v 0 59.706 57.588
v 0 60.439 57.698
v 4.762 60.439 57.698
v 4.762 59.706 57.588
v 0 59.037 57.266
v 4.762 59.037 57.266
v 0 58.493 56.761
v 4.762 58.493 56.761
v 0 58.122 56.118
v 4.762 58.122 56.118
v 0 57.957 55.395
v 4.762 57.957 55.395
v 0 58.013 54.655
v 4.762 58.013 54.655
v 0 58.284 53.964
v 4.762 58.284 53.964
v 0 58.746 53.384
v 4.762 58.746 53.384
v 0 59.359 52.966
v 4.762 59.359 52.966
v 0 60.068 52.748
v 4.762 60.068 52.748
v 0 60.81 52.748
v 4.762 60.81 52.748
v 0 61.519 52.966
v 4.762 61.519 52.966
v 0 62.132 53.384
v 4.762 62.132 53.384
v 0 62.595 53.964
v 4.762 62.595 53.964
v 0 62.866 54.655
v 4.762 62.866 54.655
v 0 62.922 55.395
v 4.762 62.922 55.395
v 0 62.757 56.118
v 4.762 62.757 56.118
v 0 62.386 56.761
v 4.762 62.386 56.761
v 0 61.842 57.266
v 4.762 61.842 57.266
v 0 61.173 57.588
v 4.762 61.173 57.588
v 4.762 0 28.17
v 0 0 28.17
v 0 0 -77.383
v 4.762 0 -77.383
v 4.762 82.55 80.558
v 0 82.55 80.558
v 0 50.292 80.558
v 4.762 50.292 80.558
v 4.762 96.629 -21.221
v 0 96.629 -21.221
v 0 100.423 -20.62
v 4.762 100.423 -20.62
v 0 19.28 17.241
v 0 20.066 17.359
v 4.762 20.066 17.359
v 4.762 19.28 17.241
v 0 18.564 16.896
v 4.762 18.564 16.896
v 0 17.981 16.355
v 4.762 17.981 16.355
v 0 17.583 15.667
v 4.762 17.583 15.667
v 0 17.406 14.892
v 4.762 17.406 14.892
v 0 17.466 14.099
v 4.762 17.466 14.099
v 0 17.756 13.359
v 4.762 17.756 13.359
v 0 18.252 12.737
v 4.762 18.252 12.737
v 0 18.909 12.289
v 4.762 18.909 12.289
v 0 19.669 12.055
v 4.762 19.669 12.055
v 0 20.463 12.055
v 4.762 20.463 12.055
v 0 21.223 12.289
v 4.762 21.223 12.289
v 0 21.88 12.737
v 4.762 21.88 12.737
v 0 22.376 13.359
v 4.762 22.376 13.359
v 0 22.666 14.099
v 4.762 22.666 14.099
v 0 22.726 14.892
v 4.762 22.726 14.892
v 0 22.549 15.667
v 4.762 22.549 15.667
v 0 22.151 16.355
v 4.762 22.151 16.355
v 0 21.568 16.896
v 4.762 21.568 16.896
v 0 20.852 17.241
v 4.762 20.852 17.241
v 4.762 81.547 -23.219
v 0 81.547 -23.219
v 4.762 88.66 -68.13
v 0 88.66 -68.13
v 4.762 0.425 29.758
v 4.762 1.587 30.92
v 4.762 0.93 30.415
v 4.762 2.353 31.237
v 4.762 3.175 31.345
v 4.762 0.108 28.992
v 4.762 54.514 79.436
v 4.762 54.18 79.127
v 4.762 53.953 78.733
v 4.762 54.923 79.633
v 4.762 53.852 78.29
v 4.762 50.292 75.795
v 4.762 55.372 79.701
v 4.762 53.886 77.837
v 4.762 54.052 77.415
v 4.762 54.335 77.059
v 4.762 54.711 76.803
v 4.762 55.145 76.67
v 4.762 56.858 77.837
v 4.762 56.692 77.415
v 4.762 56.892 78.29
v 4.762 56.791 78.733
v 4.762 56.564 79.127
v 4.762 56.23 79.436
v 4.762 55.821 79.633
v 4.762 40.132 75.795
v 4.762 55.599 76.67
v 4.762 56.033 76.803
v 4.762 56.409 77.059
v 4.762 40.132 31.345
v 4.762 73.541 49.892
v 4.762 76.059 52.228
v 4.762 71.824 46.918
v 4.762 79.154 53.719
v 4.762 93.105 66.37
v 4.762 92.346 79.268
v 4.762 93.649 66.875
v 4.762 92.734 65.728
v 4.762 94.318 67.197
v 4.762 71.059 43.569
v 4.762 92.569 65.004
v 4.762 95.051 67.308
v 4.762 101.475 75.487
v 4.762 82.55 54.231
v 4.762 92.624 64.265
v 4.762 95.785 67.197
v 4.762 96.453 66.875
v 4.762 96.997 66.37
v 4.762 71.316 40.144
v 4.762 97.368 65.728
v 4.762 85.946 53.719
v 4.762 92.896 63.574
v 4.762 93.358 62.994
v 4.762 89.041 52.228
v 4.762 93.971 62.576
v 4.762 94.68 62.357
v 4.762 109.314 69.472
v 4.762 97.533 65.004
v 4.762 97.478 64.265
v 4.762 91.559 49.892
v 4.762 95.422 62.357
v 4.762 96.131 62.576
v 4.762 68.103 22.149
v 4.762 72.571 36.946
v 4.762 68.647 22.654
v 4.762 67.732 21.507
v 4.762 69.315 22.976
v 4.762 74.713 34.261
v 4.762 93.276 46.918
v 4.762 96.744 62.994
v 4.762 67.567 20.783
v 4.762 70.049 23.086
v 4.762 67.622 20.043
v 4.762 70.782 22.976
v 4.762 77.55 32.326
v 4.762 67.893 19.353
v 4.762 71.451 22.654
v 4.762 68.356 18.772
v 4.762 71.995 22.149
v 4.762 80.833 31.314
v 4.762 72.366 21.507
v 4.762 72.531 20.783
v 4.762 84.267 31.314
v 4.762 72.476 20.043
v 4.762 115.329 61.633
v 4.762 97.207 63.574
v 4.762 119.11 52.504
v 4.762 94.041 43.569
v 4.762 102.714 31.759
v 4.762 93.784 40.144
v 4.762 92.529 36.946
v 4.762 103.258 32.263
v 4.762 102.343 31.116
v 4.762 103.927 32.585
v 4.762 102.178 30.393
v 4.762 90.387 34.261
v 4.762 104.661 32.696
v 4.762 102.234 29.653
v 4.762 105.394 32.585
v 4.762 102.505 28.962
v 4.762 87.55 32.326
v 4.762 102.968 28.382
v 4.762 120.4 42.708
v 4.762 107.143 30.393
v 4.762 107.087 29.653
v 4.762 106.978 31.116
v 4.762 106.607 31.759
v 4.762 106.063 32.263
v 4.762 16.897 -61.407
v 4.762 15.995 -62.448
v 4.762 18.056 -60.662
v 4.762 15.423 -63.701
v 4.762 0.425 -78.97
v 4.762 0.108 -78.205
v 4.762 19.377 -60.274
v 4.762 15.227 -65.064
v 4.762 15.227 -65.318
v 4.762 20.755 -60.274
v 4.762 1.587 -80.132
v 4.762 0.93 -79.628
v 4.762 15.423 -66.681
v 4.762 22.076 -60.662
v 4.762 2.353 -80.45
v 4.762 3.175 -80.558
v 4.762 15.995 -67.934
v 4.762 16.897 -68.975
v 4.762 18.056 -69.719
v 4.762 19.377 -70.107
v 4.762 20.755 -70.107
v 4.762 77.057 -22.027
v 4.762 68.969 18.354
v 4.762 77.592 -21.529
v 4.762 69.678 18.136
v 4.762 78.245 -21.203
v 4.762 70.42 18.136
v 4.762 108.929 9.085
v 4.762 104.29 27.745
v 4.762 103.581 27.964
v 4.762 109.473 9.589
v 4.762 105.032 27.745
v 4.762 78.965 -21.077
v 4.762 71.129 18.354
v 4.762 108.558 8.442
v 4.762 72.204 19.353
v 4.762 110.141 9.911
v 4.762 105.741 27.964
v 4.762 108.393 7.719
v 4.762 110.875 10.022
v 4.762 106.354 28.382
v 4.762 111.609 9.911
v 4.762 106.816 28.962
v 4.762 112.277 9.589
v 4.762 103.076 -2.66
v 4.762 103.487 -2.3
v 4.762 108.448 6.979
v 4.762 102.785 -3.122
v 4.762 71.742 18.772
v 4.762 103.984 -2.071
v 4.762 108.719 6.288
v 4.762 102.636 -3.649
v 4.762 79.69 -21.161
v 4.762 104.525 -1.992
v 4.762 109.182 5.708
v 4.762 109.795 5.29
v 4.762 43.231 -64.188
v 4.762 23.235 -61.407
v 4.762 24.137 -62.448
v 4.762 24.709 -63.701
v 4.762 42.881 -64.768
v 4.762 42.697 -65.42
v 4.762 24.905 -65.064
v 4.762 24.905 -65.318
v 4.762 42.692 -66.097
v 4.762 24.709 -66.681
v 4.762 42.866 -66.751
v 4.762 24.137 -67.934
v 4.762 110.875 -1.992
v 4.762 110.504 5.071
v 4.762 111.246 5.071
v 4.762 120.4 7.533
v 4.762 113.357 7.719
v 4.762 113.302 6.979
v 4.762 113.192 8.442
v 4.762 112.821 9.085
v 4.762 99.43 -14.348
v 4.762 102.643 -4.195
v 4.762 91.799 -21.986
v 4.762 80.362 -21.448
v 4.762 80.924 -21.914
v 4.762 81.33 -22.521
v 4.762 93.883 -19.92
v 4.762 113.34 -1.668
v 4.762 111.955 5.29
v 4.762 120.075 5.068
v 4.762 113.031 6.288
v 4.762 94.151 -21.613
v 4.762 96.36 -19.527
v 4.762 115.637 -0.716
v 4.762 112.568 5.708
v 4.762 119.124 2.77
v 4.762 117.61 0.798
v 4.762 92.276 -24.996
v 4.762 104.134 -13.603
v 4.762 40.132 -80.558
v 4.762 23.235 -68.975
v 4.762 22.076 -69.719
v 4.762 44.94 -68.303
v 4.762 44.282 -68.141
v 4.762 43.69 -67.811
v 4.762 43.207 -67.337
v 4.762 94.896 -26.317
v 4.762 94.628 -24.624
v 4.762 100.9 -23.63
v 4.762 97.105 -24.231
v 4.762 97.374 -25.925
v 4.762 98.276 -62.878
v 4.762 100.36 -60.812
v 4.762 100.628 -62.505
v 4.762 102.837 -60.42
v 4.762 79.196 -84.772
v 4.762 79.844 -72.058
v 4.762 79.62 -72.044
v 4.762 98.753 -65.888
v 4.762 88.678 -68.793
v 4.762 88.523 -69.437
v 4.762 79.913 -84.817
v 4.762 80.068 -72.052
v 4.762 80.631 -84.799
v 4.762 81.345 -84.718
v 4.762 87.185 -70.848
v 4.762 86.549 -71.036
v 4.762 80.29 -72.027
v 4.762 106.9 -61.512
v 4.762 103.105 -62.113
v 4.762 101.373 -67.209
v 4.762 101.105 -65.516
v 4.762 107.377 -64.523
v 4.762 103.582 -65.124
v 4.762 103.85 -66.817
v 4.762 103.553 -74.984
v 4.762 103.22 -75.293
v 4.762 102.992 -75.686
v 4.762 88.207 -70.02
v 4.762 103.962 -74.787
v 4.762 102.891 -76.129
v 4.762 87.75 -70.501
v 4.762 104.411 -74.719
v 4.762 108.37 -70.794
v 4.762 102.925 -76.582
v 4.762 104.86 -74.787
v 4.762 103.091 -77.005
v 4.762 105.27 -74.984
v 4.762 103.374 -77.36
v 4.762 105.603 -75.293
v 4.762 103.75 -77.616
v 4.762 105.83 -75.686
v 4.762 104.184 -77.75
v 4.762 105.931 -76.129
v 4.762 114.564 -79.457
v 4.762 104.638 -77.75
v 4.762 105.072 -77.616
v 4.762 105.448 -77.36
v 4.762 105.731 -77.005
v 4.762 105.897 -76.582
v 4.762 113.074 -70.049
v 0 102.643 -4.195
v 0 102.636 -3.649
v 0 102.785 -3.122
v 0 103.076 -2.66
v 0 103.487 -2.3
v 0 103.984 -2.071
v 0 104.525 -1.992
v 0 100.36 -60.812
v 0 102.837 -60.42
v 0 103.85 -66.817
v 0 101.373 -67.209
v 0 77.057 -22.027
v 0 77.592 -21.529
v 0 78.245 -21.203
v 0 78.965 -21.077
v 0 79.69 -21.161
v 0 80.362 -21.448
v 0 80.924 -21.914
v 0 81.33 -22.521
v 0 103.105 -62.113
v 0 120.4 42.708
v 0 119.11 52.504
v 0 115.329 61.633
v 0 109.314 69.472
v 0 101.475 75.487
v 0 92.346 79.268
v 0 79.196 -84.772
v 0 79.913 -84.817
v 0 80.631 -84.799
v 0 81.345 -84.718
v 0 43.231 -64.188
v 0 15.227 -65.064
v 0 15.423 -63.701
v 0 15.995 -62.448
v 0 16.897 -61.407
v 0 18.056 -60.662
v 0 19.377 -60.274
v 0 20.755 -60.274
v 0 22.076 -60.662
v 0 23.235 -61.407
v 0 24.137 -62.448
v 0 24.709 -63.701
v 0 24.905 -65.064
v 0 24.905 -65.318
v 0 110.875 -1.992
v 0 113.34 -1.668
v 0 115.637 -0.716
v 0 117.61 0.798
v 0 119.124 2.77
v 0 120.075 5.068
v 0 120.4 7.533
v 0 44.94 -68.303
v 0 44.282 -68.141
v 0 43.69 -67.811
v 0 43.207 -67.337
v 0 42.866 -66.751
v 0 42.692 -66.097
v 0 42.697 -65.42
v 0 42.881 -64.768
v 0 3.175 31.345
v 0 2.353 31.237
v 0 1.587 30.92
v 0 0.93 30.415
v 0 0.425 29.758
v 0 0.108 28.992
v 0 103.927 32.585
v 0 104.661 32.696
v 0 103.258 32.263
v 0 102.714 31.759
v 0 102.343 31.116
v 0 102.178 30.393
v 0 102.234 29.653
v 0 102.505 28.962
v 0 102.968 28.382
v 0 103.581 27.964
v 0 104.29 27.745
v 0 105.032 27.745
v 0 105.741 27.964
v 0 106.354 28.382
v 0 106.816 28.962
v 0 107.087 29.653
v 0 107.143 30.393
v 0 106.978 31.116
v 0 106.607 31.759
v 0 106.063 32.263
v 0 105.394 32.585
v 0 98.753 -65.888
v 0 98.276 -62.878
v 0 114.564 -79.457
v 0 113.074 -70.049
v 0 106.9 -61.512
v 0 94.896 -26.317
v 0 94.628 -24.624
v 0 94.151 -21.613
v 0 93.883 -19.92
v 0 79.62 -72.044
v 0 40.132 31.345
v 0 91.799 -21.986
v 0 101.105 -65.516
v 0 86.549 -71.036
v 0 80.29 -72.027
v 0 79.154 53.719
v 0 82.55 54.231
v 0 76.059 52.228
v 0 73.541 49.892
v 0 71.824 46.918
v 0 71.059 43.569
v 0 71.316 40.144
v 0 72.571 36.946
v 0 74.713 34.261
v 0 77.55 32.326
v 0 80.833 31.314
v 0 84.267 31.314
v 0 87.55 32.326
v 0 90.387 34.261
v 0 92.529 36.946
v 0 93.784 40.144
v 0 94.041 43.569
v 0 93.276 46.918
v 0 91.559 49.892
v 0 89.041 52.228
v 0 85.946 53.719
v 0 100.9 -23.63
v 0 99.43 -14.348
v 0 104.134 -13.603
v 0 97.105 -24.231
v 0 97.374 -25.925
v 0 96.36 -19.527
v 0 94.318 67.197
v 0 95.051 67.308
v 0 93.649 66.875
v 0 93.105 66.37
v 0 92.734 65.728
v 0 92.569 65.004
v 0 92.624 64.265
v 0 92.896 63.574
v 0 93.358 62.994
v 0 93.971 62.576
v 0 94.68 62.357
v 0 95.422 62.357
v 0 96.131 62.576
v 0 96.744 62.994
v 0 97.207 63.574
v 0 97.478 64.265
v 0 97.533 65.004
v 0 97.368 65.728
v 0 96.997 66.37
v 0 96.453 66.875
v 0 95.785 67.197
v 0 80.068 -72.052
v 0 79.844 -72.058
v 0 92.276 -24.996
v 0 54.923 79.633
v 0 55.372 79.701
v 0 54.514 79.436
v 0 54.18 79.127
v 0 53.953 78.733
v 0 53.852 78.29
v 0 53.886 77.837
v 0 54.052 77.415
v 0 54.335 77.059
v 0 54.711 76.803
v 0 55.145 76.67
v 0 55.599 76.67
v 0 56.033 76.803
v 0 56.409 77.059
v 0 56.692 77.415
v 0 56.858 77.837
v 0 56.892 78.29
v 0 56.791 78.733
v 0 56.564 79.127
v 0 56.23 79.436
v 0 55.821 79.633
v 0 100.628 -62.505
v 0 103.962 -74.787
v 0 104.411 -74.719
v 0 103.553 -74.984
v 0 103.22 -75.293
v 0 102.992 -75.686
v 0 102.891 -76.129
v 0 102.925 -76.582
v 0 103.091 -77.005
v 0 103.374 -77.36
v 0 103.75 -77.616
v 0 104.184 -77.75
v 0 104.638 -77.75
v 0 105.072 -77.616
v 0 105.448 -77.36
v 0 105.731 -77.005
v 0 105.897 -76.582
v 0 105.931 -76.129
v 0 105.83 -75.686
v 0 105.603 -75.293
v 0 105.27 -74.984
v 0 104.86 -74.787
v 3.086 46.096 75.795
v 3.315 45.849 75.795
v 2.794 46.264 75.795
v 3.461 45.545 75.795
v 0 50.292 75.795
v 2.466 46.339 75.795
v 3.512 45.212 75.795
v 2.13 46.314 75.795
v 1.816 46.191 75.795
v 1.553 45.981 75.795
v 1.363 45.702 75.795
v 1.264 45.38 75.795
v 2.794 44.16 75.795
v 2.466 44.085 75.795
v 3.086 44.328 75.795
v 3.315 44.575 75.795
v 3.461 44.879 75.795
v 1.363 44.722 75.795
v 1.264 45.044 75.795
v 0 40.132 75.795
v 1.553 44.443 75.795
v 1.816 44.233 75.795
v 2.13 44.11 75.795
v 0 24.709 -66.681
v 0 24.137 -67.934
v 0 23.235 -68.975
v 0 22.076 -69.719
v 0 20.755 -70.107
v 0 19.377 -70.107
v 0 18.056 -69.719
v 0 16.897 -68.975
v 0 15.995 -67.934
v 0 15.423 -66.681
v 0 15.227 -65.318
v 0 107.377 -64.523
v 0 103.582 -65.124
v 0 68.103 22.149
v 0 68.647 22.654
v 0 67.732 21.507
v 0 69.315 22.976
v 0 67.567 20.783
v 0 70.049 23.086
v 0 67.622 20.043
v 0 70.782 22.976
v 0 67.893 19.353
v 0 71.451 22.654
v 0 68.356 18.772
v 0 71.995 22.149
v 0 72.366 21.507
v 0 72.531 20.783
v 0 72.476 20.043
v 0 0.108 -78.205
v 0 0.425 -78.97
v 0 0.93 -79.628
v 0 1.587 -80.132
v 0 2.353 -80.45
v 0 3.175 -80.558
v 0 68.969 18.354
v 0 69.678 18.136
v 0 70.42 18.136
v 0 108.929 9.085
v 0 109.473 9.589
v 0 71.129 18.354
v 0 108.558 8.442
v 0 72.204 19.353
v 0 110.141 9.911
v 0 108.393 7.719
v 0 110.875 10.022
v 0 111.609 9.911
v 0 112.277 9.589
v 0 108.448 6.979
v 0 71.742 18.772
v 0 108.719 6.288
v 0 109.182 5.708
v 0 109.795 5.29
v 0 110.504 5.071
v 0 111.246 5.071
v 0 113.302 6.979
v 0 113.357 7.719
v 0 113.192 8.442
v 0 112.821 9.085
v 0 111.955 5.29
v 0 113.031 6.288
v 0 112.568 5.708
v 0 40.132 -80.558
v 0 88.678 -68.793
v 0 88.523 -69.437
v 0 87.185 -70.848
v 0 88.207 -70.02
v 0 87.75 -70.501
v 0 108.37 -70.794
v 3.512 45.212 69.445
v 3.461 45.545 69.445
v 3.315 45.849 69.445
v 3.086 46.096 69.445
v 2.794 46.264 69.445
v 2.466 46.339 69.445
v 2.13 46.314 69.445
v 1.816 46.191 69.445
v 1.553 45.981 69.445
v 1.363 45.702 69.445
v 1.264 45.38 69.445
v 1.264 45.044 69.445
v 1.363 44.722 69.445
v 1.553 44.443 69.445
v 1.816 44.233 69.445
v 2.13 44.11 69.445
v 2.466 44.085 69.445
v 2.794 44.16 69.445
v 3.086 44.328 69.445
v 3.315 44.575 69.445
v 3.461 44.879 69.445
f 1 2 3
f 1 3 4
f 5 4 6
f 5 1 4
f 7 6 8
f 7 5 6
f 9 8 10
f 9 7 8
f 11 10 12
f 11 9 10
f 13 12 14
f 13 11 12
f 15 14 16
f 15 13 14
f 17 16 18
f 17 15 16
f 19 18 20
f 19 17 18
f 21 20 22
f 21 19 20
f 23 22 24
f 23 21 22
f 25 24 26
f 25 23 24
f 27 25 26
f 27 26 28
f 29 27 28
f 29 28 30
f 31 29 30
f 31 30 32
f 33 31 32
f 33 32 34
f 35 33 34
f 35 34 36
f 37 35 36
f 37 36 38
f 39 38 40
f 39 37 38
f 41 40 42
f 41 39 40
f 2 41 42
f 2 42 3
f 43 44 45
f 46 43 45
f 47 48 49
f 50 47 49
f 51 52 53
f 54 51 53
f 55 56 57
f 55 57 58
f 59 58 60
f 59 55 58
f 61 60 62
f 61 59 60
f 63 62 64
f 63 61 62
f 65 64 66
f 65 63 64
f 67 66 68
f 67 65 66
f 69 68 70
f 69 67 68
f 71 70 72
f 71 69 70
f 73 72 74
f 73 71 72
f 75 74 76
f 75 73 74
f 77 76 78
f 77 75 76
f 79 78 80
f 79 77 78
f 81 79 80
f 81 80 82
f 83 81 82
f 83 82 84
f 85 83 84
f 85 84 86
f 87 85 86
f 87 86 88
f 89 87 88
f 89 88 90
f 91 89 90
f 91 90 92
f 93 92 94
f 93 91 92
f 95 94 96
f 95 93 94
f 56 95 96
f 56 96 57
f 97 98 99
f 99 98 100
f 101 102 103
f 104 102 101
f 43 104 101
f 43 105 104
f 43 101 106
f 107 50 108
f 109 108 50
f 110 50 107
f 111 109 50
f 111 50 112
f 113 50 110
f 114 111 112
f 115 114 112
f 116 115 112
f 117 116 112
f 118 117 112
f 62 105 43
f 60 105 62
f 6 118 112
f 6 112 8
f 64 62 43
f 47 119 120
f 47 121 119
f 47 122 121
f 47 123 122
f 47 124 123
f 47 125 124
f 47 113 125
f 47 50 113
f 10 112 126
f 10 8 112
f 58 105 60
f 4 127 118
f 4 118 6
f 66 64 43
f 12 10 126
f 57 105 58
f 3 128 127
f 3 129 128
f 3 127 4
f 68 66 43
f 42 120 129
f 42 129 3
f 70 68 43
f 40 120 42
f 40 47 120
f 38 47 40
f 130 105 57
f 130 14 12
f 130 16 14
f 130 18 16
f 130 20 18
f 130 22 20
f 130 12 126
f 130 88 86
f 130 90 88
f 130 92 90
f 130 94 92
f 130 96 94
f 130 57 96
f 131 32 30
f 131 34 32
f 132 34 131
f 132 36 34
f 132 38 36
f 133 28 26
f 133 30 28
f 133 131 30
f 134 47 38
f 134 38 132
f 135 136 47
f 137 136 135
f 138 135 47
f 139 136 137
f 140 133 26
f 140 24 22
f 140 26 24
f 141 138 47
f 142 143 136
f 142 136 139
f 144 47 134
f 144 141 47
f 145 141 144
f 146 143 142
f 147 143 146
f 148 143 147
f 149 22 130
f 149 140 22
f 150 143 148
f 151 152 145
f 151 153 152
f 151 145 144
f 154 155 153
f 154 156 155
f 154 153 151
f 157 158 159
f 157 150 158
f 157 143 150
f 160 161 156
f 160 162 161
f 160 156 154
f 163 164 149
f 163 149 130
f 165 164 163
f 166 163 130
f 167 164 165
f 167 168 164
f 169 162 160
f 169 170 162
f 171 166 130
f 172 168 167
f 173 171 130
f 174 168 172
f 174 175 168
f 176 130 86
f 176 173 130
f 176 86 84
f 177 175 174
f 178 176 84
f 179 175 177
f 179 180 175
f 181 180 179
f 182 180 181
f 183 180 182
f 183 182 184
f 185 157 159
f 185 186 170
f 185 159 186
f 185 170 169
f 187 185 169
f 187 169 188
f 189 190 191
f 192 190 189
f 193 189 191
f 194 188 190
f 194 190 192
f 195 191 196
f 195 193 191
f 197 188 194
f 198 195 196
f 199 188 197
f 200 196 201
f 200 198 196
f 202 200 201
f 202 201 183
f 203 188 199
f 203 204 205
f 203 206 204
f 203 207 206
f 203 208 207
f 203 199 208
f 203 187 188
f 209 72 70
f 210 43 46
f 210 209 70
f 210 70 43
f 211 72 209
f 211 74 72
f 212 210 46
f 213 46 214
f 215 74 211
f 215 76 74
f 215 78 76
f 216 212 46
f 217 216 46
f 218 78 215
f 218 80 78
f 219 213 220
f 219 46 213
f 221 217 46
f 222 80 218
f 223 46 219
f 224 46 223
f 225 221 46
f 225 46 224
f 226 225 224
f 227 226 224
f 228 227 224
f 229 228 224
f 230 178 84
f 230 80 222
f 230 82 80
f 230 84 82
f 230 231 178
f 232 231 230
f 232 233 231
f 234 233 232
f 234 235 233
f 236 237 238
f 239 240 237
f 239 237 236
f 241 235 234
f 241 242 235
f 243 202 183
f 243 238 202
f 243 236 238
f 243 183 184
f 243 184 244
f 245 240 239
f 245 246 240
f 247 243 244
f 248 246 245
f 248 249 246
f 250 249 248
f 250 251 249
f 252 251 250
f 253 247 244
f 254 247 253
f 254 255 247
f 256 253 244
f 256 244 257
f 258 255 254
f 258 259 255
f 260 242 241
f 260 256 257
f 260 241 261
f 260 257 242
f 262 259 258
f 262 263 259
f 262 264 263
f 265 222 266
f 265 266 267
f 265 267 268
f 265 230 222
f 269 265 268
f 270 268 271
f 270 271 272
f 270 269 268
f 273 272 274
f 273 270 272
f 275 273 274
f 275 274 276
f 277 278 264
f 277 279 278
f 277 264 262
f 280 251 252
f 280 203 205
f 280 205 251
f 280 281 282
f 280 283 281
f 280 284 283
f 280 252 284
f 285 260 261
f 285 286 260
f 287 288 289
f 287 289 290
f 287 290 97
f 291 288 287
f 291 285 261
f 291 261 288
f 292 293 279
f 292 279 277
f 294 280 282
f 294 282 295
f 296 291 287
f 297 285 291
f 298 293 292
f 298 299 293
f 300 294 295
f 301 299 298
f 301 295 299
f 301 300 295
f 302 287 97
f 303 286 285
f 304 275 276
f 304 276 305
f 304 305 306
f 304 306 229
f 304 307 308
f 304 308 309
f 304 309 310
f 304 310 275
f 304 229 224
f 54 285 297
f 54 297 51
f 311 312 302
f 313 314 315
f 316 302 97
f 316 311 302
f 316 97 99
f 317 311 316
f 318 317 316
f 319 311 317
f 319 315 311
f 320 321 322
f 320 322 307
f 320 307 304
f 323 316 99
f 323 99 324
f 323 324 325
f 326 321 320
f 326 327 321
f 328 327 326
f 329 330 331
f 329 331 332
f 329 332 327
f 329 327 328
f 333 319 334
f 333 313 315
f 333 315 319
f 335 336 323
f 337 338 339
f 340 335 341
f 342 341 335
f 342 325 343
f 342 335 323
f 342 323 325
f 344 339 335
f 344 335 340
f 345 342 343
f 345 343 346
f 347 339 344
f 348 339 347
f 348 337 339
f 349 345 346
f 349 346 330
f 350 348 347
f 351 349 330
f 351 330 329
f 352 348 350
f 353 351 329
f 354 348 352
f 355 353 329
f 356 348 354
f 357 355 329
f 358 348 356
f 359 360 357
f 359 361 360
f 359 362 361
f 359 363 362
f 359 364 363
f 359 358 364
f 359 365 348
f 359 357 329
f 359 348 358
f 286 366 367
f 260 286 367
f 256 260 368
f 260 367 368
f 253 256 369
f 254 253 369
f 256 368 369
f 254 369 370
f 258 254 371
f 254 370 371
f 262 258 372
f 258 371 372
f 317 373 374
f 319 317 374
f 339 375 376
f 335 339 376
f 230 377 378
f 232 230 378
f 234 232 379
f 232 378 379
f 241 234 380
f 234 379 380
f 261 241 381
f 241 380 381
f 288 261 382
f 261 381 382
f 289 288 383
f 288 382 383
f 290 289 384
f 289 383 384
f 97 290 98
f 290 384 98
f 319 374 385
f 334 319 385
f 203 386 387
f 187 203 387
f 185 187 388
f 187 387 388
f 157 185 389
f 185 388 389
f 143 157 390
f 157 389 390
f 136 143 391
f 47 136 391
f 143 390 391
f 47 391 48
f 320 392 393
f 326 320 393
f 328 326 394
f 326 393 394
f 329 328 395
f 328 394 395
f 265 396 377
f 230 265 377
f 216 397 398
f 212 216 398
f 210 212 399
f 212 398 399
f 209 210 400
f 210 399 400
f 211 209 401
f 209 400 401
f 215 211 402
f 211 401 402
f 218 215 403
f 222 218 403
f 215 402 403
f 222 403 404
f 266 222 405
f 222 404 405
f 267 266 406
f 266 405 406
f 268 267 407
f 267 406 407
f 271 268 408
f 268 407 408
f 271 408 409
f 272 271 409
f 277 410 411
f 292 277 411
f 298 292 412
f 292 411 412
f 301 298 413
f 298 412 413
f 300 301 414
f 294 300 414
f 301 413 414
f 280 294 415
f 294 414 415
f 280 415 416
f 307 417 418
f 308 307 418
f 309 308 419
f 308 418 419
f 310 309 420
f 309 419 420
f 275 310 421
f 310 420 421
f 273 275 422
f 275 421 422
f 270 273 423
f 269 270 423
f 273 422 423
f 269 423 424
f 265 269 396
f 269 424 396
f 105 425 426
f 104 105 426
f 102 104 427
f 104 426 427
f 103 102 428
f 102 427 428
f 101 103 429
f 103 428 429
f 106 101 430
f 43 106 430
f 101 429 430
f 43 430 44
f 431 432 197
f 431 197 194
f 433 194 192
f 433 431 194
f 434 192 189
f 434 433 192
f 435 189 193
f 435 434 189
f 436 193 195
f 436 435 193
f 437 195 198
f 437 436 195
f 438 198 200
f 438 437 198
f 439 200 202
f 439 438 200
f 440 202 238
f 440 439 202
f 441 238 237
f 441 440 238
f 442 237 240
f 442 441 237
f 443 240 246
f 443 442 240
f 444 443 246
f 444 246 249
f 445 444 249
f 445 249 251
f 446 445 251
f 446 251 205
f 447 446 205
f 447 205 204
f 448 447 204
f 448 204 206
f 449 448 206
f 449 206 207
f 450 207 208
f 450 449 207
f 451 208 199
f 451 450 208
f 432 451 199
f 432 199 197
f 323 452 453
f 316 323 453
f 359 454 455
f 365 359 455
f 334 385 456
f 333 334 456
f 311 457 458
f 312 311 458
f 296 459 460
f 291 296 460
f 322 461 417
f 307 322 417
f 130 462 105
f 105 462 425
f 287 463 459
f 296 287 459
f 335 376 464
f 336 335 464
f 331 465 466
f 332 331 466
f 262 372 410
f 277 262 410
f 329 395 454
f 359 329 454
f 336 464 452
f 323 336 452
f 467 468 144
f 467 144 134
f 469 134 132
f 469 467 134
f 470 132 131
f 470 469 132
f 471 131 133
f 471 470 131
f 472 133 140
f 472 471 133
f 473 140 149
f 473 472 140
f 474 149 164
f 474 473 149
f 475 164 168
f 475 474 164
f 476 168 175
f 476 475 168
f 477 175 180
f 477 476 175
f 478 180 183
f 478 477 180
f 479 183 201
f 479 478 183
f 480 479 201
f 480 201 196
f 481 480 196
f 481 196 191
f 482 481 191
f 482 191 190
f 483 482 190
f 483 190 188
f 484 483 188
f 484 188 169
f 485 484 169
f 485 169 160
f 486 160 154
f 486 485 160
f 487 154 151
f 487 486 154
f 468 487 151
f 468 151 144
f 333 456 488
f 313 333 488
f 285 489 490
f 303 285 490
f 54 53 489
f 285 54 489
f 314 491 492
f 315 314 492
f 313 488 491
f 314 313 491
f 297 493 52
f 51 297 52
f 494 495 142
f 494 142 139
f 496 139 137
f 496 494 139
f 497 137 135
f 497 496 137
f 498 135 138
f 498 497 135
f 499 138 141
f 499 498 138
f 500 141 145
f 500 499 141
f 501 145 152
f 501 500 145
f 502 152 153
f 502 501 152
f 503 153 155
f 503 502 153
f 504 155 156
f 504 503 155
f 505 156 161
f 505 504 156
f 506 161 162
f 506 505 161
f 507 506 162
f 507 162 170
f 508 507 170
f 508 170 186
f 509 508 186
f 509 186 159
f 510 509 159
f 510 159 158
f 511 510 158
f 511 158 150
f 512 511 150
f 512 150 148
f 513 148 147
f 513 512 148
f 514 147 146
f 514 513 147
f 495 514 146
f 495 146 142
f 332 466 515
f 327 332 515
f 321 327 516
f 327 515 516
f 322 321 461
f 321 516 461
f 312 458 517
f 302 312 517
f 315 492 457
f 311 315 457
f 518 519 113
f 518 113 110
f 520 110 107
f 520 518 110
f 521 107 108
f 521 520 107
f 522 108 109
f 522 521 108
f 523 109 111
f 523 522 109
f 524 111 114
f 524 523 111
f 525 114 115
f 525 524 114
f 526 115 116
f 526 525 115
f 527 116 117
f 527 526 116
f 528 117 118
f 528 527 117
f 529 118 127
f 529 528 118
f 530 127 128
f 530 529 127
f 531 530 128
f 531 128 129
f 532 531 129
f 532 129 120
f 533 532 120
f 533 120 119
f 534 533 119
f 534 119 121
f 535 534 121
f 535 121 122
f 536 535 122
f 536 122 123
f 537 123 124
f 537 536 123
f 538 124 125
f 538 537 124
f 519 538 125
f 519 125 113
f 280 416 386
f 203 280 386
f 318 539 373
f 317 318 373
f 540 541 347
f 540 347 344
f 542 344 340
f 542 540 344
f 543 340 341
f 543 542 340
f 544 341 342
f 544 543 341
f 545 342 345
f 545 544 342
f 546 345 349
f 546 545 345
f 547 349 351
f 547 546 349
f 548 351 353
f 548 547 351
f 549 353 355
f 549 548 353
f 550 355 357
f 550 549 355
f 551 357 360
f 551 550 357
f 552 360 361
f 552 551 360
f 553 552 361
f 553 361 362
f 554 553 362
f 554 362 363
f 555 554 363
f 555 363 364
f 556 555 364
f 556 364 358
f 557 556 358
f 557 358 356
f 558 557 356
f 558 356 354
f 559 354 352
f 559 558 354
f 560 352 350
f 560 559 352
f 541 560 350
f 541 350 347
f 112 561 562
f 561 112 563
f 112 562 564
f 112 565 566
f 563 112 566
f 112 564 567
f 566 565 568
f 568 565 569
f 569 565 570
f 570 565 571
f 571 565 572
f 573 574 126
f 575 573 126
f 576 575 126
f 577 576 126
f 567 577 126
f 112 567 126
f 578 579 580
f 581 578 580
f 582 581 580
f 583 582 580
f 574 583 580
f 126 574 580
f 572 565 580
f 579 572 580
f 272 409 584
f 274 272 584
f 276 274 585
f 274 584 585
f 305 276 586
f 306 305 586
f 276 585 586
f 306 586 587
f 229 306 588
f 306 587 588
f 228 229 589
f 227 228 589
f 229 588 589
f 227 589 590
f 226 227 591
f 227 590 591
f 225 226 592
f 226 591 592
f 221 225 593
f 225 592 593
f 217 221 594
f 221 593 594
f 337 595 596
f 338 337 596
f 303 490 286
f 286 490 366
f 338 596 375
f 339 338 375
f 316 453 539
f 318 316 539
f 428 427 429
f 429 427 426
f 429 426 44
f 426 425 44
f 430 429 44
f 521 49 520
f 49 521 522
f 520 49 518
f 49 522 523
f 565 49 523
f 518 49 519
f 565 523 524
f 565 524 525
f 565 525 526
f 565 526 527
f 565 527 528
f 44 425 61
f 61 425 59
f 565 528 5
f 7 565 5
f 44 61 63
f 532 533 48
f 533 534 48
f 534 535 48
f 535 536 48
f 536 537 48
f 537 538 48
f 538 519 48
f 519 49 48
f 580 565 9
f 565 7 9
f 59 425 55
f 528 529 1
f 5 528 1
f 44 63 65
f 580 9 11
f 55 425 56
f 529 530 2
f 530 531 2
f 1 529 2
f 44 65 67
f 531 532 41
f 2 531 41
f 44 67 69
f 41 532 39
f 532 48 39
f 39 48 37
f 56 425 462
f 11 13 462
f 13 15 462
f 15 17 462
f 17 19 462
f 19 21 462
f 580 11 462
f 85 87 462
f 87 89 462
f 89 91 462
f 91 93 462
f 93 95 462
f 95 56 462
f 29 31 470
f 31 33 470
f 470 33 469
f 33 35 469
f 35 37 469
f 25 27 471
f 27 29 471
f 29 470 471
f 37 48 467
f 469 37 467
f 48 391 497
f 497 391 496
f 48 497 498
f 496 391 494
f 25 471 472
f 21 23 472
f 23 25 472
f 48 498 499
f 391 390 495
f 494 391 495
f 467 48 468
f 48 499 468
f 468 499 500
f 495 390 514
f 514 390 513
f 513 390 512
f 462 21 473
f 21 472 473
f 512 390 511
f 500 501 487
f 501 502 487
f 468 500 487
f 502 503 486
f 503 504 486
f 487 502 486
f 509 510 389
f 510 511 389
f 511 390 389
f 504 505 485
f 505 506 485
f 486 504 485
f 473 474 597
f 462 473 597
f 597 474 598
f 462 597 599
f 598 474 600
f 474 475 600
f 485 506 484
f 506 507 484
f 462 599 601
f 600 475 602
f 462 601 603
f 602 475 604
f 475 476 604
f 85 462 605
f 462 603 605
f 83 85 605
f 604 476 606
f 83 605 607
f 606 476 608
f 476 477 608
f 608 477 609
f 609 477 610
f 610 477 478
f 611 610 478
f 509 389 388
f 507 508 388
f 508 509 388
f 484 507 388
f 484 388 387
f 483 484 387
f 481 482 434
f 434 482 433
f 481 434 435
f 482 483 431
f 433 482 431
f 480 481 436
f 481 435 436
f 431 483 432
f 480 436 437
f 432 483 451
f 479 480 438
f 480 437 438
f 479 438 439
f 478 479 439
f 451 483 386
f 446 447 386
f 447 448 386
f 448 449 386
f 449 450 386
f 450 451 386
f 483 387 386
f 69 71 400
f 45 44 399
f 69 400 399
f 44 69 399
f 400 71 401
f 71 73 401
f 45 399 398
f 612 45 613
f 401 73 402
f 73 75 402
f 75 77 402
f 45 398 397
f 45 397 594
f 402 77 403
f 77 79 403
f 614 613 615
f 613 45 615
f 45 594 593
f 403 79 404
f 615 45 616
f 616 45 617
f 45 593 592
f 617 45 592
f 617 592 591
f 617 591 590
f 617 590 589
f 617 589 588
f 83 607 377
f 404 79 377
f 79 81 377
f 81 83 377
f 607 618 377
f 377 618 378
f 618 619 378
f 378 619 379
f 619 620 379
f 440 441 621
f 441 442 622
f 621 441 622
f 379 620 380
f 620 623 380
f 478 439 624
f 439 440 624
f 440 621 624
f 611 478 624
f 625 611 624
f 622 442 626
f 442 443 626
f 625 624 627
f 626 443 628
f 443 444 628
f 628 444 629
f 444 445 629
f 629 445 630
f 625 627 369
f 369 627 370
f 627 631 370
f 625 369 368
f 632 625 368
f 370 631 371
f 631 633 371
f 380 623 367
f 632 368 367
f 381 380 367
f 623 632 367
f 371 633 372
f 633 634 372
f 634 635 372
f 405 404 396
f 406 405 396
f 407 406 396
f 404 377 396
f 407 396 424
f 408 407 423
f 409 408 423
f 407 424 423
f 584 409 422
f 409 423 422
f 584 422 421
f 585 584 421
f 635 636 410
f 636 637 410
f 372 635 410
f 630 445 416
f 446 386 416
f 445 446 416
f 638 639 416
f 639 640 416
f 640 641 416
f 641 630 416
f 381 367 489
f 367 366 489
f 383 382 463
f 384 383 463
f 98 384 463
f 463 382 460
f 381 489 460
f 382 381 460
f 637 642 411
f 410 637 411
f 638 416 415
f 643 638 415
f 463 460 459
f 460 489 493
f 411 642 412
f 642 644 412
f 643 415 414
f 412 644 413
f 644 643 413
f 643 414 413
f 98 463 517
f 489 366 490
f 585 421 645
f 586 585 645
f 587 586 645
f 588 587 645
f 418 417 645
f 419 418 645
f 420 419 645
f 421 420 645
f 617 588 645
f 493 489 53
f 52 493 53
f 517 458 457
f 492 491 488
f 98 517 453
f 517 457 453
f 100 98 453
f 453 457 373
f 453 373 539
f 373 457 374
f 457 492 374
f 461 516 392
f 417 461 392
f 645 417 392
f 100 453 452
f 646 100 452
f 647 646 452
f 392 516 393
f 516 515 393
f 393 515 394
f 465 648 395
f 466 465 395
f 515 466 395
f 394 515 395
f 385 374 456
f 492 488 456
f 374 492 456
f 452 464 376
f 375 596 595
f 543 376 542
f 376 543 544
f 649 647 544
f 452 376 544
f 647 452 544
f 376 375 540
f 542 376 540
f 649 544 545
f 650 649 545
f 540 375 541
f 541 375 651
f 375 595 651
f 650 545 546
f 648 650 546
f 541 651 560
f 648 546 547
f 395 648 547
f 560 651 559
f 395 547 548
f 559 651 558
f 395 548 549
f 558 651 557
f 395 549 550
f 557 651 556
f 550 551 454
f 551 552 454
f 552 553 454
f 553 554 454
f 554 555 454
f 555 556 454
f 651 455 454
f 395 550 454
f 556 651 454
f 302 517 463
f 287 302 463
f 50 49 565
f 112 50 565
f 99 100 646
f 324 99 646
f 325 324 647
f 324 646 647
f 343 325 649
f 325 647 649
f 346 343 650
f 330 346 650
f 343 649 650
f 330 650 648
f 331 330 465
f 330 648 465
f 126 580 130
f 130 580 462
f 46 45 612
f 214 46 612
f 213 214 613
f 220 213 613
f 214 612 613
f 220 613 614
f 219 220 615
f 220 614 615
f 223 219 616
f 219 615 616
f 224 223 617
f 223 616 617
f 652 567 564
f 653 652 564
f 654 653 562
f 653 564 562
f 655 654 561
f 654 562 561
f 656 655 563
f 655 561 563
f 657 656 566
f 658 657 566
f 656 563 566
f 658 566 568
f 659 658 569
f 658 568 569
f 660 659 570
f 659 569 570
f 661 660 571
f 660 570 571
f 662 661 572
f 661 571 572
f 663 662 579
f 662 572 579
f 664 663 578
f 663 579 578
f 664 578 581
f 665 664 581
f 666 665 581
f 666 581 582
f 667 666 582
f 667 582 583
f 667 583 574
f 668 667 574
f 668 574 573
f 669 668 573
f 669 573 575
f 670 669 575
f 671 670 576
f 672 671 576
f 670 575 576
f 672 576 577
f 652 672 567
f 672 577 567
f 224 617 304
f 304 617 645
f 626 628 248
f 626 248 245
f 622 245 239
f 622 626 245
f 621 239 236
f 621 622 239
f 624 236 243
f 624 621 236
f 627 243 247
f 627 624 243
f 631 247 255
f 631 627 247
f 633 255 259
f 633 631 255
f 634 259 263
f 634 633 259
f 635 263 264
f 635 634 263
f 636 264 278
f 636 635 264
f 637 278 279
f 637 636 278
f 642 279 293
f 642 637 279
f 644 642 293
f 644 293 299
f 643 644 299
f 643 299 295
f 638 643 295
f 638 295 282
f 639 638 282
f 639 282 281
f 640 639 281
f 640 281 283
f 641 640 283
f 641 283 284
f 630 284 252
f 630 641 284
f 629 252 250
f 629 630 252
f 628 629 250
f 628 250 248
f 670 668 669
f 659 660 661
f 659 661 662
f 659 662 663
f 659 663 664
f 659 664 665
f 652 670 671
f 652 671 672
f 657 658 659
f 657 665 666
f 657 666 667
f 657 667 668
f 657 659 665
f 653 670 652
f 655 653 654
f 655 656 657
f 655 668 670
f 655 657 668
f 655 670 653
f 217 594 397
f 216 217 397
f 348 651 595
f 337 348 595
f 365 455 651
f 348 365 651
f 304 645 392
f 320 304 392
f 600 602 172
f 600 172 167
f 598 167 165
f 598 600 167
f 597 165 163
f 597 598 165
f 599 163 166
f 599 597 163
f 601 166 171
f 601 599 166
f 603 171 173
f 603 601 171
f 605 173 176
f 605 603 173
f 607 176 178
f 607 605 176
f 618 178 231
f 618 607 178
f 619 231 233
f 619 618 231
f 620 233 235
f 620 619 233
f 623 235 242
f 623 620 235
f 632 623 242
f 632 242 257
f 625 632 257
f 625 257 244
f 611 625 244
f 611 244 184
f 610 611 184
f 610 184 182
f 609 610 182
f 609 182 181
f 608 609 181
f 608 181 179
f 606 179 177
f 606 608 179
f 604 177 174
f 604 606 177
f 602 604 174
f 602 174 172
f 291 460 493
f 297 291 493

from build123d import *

# Parameters (mm, degrees)
SKETCH1_R           = 2.4892
SKETCH1_R_2         = 2.667
SKETCH1_R_3         = 1.524
SKETCH1_R_4         = 11.522750336
BOSS_EXTRUDE1_DEPTH = 4.7625
SKETCH2_R           = 1.1303
CUT_EXTRUDE1_DEPTH  = 6.35


with BuildPart() as part:
    # Sketch1 → Boss-Extrude1 (new body)
    with BuildSketch(Plane(origin=(0, 0, 0), x_dir=(0, 0, -1), z_dir=(1, 0, 0))):
        with BuildLine():
            Line((-28.170295117, 0), (77.382795117, 0))
            ThreePointArc((77.382795117, 0), (79.627859148, 0.92993597), (80.557795117, 3.175))
            Line((80.557795117, 3.175), (80.557795117, 40.132))
            Line((80.557795117, 40.132), (84.771740045, 79.196103092))
            ThreePointArc((84.771740045, 79.196103092), (84.816236398, 80.272287311), (84.718413682, 81.344939685))
            Line((84.718413682, 81.344939685), (79.457064092, 114.563793628))
            Line((79.457064092, 114.563793628), (70.049332648, 113.073755348))
            Line((70.049332648, 113.073755348), (70.794351787, 108.369889626))
            Line((70.794351787, 108.369889626), (64.522530825, 107.376530773))
            Line((64.522530825, 107.376530773), (65.123512931, 103.582079091))
            Line((65.123512931, 103.582079091), (66.816904591, 103.850285981))
            Line((66.816904591, 103.850285981), (67.209281338, 101.372916701))
            Line((67.209281338, 101.372916701), (65.515889678, 101.10470981))
            Line((65.515889678, 101.10470981), (65.888399247, 98.752776949))
            Line((65.888399247, 98.752776949), (62.877925185, 98.2759647))
            Line((62.877925185, 98.2759647), (62.505415615, 100.627897561))
            Line((62.505415615, 100.627897561), (60.812023956, 100.359690671))
            Line((60.812023956, 100.359690671), (60.419647209, 102.837059951))
            Line((60.419647209, 102.837059951), (62.113038869, 103.105266841))
            Line((62.113038869, 103.105266841), (61.512056762, 106.899718524))
            Line((61.512056762, 106.899718524), (23.630258147, 100.899831052))
            Line((23.630258147, 100.899831052), (24.231240253, 97.105379369))
            Line((24.231240253, 97.105379369), (25.924631913, 97.373586259))
            Line((25.924631913, 97.373586259), (26.31700866, 94.896216979))
            Line((26.31700866, 94.896216979), (24.623617, 94.628010089))
            Line((24.623617, 94.628010089), (24.99612657, 92.276077228))
            Line((24.99612657, 92.276077228), (21.985652508, 91.799264978))
            Line((21.985652508, 91.799264978), (21.613142938, 94.151197839))
            Line((21.613142938, 94.151197839), (19.919751278, 93.882990949))
            Line((19.919751278, 93.882990949), (19.527374531, 96.360360229))
            Line((19.527374531, 96.360360229), (21.220766191, 96.62856712))
            Line((21.220766191, 96.62856712), (20.619784085, 100.423018802))
            Line((20.619784085, 100.423018802), (14.347963122, 99.429659949))
            Line((14.347963122, 99.429659949), (13.602943983, 104.133525671))
            Line((13.602943983, 104.133525671), (4.195212538, 102.643487392))
            ThreePointArc((4.195212538, 102.643487392), (2.66000635, 103.076460316), (1.992204883, 104.52503368))
            Line((1.992204883, 104.52503368), (1.992204883, 110.875))
            ThreePointArc((1.992204883, 110.875), (-0.797603027, 117.610192091), (-7.532795117, 120.4))
            Line((-7.532795117, 120.4), (-42.707795117, 120.4))
            ThreePointArc((-42.707795117, 120.4), (-69.471786785, 109.313991668), (-80.557795117, 82.55))
            Line((-80.557795117, 82.55), (-80.557795117, 50.292))
            Line((-80.557795117, 50.292), (-75.795295117, 50.292))
            Line((-75.795295117, 50.292), (-75.795295117, 40.132))
            Line((-75.795295117, 40.132), (-31.345295117, 40.132))
            Line((-31.345295117, 40.132), (-31.345295117, 3.175))
            ThreePointArc((-31.345295117, 3.175), (-30.415359148, 0.92993597), (-28.170295117, 0))
        make_face()
        with Locations(Location((-55.209041359, 60.43939525, 0), (0, 0, 180))):
            Circle(SKETCH1_R, mode=Mode.SUBTRACT)
        with Locations(Location((-14.692204883, 20.066, 0), (0, 0, 180))):
            Circle(SKETCH1_R_2, mode=Mode.SUBTRACT)
        with Locations(Location((-20.597190367, 70.048753759, 0), (0, 0, 180))):
            Circle(SKETCH1_R, mode=Mode.SUBTRACT)
        with Locations(Location((-64.818399868, 95.051246241, 0), (0, 0, 180))):
            Circle(SKETCH1_R, mode=Mode.SUBTRACT)
        with Locations(Location((-30.206548876, 104.66060475, 0), (0, 0, 180))):
            Circle(SKETCH1_R, mode=Mode.SUBTRACT)
        with Locations(Location((-78.176545117, 55.372, 0), (0, 0, 180))):
            Circle(SKETCH1_R_3, mode=Mode.SUBTRACT)
        with Locations(Location((-42.707795117, 82.55, 0), (0, 0, 180))):
            Circle(SKETCH1_R_4, mode=Mode.SUBTRACT)
        with Locations(Location((-7.532795117, 110.875, 0), (0, 0, 180))):
            Circle(SKETCH1_R, mode=Mode.SUBTRACT)
        with Locations(Location((76.243236649, 104.411043044, 0), (0, 0, 180))):
            Circle(SKETCH1_R_3, mode=Mode.SUBTRACT)
        with BuildLine():
            Line((65.317795117, 15.2273), (65.063795117, 15.2273))
            ThreePointArc((65.063795117, 15.2273), (60.225095117, 20.066), (65.063795117, 24.9047))
            Line((65.063795117, 24.9047), (65.317795117, 24.9047))
            ThreePointArc((65.317795117, 24.9047), (70.156495117, 20.066), (65.317795117, 15.2273))
        make_face(mode=Mode.SUBTRACT)
        with BuildLine():
            Line((71.035861406, 86.549018926), (72.027193342, 80.289995416))
            ThreePointArc((72.027193342, 80.289995416), (72.057683184, 79.9556661), (72.043814352, 79.620235963))
            Line((72.043814352, 79.620235963), (68.302723543, 44.939584088))
            ThreePointArc((68.302723543, 44.939584088), (66.751491112, 42.866217372), (64.187855338, 43.230831164))
            Line((64.187855338, 43.230831164), (22.026684653, 77.057314107))
            ThreePointArc((22.026684653, 77.057314107), (21.161269703, 79.690326664), (23.218859921, 81.547211328))
            Line((23.218859921, 81.547211328), (68.12978948, 88.66040377))
            ThreePointArc((68.12978948, 88.66040377), (70.020107562, 88.206578551), (71.035861406, 86.549018926))
        make_face(mode=Mode.SUBTRACT)
    extrude(amount=BOSS_EXTRUDE1_DEPTH)

    # Sketch2 → Cut-Extrude1 (cut)
    with BuildSketch(Plane.XY.offset(75.795295117)):
        with Locations((2.38125, 45.212)):
            Circle(SKETCH2_R)
    extrude(amount=-CUT_EXTRUDE1_DEPTH, mode=Mode.SUBTRACT)


solid = part.part
